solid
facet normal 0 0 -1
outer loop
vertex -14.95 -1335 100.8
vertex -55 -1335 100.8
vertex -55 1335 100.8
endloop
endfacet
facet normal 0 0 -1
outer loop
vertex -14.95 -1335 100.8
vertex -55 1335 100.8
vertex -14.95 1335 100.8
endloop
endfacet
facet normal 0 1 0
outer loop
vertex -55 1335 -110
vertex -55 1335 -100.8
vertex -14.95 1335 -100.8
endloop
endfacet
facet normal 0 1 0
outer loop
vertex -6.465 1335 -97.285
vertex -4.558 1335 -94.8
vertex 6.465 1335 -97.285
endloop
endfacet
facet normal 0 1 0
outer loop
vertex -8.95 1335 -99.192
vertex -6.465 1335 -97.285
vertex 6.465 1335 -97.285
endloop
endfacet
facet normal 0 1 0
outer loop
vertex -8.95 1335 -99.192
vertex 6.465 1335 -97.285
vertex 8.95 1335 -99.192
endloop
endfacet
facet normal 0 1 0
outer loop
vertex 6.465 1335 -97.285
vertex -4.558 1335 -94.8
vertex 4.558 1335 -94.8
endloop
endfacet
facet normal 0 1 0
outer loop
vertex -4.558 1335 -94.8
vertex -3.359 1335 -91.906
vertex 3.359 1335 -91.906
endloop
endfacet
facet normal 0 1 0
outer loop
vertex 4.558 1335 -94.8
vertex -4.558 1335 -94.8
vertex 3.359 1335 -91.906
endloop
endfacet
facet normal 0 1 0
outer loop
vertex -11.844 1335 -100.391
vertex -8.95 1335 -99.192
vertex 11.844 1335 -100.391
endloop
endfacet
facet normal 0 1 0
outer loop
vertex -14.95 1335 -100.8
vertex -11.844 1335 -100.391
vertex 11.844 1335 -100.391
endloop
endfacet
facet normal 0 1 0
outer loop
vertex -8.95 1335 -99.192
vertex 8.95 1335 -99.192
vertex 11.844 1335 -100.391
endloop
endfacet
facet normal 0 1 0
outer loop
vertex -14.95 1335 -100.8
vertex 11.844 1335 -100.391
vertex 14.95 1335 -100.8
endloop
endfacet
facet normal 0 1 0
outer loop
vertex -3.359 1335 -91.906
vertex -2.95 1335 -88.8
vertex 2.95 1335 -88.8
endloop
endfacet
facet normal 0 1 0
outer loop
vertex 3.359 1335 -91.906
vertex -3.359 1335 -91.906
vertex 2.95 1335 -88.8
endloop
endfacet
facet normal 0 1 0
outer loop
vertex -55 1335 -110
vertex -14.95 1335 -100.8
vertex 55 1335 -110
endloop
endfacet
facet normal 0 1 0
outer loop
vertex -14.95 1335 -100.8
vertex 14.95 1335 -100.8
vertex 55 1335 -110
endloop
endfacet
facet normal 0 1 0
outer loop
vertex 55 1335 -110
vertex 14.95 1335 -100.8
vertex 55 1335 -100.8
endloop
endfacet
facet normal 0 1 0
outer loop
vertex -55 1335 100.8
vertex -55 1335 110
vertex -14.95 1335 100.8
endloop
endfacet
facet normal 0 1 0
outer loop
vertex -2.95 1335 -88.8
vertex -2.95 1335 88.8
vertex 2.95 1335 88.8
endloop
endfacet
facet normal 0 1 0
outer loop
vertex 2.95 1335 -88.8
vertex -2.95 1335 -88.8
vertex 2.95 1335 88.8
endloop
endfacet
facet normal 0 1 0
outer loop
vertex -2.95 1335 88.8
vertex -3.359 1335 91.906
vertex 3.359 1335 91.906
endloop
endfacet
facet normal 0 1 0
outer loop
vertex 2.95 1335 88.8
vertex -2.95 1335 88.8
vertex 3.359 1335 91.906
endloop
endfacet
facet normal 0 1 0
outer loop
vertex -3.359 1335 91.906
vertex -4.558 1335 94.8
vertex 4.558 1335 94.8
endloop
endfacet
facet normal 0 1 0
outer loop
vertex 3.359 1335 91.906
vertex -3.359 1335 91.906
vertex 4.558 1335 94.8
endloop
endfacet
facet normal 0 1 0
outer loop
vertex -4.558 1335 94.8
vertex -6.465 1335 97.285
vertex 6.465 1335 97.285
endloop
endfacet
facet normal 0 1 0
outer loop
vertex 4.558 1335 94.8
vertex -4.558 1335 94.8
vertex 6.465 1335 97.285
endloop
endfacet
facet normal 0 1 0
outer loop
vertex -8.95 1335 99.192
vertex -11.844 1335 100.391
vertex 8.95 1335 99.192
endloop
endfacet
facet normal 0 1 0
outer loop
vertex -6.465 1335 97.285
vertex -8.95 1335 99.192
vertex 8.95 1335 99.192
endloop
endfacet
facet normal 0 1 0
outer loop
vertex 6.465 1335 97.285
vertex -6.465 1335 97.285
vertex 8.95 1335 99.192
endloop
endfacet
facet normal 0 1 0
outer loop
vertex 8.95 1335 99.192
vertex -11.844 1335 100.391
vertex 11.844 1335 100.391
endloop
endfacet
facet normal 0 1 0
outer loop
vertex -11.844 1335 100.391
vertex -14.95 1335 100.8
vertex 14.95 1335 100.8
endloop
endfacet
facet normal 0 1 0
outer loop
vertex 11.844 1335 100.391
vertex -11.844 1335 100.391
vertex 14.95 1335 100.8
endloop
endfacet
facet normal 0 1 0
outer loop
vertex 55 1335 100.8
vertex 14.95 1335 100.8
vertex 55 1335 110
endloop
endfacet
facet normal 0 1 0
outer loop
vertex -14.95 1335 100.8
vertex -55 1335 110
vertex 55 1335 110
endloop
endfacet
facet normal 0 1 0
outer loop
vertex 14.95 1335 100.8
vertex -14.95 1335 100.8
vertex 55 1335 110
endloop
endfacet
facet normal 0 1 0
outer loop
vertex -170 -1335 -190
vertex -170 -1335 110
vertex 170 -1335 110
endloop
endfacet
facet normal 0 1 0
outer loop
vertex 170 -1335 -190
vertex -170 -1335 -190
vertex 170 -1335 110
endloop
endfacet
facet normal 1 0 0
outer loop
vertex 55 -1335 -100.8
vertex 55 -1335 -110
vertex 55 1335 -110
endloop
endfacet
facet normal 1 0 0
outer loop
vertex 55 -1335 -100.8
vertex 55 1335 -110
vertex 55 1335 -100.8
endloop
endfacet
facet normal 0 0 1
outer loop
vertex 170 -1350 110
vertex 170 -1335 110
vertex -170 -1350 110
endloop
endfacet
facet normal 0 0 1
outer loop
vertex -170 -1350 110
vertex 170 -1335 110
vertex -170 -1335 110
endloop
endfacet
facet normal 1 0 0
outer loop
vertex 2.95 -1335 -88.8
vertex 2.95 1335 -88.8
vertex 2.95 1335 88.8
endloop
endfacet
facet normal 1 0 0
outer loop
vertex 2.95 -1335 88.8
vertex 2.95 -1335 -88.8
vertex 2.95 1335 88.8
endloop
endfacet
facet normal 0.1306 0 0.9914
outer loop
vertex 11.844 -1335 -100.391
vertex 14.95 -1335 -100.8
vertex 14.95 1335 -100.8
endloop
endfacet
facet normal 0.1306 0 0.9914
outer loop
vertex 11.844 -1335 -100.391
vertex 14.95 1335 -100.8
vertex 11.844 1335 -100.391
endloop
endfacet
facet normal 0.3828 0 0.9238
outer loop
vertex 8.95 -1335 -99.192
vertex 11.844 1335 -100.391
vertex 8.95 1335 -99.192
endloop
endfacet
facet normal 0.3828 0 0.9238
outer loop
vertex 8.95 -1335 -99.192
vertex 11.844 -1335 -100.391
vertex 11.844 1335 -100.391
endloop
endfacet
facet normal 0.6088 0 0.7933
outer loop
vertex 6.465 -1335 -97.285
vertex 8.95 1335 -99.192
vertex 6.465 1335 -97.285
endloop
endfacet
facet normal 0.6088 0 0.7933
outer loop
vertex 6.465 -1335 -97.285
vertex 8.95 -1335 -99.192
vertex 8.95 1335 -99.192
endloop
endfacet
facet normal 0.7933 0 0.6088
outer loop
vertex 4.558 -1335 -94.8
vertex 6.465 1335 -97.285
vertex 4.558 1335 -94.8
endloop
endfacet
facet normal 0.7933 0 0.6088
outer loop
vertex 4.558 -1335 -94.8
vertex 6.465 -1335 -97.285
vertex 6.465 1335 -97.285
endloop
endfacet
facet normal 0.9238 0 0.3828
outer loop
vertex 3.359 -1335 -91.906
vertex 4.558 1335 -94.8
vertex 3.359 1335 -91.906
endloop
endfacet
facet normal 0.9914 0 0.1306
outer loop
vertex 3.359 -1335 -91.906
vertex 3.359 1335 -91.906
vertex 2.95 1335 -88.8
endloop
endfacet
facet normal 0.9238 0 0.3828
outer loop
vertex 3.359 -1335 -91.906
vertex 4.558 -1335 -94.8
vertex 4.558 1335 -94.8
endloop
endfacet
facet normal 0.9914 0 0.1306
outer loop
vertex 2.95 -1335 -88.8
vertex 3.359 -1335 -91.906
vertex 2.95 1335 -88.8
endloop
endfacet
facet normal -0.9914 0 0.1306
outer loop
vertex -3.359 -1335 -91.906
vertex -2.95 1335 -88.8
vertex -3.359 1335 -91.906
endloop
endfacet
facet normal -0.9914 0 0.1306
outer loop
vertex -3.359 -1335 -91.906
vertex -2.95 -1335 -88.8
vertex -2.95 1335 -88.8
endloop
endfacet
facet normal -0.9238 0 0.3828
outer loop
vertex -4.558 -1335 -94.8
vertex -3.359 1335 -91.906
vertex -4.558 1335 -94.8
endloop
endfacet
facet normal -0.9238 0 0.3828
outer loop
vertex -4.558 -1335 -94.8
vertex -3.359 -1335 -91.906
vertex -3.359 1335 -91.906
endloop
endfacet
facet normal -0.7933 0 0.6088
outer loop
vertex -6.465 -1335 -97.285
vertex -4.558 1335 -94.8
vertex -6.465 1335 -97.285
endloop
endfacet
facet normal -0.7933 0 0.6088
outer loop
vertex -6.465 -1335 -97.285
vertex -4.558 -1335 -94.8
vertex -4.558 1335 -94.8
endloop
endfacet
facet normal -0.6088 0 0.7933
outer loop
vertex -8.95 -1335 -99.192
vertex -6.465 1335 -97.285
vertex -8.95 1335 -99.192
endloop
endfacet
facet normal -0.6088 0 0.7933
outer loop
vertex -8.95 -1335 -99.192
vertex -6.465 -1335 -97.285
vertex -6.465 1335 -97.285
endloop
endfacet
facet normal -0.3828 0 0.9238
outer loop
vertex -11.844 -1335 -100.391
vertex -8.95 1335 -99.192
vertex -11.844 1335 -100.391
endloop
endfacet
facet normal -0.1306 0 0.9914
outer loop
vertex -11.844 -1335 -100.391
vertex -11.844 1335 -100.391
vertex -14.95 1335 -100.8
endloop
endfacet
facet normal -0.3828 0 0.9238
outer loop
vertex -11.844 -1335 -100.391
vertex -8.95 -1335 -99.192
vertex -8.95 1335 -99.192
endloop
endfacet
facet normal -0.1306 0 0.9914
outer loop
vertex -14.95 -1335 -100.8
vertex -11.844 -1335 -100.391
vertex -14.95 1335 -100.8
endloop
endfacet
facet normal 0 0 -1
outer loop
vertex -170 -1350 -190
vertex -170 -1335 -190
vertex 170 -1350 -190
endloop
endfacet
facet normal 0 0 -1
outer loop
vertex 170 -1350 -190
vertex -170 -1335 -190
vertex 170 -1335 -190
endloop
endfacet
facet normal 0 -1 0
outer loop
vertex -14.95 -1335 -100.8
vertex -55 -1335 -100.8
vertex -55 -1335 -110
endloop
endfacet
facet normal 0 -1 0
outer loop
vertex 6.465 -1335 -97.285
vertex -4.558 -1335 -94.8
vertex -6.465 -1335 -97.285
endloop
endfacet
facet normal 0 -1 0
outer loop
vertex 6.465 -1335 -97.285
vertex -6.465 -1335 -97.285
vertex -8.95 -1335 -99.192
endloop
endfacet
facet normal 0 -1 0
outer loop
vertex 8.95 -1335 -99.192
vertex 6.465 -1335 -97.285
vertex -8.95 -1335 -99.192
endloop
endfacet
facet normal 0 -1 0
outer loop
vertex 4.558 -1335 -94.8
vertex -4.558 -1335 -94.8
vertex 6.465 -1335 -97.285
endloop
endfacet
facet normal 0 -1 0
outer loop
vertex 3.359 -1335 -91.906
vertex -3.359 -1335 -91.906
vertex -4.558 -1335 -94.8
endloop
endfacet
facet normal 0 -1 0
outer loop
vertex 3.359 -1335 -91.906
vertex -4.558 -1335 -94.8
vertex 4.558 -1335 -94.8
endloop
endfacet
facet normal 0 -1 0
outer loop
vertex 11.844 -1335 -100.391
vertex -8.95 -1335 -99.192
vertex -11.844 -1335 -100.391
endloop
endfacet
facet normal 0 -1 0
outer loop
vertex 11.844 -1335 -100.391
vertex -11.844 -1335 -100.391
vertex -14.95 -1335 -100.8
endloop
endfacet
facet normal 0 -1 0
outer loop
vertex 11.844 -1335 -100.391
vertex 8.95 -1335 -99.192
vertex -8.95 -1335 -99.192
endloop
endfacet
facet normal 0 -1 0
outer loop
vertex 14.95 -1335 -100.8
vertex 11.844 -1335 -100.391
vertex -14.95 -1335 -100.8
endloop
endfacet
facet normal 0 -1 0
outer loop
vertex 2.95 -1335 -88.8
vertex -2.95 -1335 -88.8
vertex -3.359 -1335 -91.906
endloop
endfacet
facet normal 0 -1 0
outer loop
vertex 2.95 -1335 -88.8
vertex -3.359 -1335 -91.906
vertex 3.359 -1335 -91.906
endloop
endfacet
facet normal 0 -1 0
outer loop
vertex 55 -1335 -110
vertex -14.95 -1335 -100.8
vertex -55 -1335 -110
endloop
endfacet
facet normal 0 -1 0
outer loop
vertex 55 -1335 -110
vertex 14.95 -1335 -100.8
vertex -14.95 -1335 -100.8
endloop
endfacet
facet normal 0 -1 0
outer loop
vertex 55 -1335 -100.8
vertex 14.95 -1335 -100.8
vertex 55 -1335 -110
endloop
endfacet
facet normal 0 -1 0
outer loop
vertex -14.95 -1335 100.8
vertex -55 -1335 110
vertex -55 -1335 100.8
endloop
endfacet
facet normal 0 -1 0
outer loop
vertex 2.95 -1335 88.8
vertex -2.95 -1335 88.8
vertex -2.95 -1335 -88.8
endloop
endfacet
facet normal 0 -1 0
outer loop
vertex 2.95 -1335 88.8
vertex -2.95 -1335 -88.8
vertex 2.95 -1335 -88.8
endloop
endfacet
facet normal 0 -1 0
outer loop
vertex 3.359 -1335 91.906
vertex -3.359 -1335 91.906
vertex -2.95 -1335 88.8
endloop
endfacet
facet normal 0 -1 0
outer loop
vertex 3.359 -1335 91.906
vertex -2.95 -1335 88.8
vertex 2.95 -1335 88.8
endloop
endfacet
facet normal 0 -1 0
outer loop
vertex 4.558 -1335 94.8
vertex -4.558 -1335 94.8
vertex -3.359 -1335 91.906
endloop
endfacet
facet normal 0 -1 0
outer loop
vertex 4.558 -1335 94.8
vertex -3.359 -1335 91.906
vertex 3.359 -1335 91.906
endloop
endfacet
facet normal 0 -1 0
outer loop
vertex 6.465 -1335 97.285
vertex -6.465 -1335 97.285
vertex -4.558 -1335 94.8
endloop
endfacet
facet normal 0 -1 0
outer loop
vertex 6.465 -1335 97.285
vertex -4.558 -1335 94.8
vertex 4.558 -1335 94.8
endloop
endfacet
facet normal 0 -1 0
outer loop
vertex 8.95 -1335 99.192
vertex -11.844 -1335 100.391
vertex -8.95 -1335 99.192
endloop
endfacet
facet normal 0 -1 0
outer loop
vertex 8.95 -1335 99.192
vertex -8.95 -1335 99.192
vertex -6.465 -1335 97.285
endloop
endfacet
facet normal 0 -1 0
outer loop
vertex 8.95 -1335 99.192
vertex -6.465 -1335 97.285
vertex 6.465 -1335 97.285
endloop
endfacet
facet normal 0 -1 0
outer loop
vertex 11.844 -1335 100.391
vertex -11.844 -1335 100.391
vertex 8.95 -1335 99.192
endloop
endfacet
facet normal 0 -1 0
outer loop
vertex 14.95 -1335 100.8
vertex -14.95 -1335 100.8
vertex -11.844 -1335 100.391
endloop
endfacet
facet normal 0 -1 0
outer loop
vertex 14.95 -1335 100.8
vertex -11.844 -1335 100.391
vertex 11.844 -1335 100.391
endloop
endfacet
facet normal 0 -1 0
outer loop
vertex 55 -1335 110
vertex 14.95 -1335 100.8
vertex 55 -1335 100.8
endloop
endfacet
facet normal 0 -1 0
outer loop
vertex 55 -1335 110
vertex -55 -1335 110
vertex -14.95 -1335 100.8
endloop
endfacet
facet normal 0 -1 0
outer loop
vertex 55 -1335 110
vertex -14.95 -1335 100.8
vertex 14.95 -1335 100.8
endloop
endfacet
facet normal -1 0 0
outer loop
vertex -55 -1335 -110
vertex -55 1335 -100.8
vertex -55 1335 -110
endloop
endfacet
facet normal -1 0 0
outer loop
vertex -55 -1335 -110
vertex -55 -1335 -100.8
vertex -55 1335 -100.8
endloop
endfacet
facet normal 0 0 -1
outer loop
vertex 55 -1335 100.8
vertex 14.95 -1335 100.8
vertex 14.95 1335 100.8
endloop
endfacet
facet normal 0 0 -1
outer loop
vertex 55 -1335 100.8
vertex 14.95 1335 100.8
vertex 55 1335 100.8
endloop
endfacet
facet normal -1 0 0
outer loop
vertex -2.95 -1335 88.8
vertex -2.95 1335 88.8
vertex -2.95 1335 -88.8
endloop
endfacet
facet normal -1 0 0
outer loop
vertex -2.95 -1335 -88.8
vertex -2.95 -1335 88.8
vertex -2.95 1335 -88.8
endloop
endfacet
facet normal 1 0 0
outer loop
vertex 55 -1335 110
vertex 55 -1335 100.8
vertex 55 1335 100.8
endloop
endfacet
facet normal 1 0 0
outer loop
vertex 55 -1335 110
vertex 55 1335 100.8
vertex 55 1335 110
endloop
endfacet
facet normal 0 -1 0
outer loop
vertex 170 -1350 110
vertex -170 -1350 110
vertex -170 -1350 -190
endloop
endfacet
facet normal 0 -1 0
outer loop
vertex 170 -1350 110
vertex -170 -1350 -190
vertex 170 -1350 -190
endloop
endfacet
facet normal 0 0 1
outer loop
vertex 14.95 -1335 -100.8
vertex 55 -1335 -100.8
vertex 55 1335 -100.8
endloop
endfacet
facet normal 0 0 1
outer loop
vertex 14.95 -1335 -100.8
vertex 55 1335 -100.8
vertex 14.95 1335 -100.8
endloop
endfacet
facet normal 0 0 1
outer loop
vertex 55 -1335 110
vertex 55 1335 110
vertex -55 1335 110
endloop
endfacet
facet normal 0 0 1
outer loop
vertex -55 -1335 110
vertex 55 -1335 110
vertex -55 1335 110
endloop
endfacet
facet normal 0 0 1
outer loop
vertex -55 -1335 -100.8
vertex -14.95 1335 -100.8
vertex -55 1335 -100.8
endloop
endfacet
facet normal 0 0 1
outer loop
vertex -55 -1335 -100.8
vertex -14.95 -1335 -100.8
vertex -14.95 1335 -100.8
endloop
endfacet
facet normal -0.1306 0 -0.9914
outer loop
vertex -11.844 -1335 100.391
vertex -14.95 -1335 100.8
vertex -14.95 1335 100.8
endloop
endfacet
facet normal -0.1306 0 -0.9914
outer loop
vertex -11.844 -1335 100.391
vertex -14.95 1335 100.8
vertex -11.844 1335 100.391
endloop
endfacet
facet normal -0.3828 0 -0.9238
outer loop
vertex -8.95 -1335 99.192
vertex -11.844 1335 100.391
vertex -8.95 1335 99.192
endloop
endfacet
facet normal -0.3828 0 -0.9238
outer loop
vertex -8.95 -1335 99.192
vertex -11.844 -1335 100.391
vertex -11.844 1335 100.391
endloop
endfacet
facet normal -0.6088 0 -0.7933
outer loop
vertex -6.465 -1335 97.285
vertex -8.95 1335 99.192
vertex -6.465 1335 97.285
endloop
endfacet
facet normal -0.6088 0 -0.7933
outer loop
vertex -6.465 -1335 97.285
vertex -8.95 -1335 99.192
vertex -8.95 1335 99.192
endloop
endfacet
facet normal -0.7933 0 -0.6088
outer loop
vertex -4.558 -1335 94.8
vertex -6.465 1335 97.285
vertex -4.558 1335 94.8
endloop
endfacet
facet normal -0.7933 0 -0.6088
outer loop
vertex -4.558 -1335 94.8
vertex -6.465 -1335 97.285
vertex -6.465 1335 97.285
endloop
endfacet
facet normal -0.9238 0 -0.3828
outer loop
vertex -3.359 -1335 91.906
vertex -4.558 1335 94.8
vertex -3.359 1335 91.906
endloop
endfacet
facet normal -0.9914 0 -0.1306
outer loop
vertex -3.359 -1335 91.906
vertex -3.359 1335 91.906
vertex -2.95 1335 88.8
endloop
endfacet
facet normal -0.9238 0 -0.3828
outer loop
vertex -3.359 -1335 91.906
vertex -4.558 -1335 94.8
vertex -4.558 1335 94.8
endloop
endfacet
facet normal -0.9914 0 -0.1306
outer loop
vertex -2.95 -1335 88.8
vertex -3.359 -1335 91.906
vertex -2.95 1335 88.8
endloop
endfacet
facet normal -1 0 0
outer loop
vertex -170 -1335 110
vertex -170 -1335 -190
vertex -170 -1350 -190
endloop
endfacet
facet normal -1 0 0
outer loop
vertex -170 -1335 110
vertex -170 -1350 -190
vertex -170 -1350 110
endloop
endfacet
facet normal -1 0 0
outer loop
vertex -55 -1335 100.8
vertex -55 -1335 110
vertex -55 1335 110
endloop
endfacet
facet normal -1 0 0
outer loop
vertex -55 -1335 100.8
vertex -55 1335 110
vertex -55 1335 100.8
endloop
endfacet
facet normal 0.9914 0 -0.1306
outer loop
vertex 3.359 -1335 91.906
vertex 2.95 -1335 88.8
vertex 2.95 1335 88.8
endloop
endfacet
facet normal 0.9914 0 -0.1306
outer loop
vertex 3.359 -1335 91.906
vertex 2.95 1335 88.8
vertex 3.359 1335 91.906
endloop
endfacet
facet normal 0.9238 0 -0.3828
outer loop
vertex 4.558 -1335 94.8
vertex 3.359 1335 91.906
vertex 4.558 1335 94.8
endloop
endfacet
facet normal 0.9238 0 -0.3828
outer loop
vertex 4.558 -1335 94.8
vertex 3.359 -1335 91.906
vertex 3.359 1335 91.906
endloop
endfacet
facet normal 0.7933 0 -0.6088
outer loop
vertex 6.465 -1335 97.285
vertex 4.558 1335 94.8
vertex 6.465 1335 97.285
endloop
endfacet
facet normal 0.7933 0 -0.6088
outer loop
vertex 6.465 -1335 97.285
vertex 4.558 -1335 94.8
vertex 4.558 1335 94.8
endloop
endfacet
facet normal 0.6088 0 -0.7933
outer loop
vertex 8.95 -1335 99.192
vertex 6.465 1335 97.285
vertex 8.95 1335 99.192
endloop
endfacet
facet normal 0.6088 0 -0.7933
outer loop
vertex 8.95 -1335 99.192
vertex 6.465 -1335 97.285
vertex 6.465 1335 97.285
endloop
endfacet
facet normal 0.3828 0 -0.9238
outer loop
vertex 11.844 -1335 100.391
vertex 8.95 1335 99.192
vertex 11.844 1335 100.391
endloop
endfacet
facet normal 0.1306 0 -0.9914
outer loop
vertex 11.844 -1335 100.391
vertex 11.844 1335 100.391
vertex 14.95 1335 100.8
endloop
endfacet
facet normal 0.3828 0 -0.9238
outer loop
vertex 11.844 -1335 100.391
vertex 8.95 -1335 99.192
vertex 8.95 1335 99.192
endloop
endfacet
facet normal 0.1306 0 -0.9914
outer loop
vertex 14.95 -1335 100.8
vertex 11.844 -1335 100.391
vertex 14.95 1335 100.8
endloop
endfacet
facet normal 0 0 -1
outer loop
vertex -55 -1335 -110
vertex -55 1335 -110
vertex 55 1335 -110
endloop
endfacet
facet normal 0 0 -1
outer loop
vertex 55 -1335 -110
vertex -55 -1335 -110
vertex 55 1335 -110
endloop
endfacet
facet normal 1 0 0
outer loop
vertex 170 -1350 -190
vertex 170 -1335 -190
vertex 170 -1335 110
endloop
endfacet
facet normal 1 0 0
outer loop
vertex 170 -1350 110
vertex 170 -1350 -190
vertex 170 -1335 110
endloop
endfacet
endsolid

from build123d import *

# Parameters (mm, degrees)
F1_DEPTH = 1335
F2_W     = 340
F2_H     = 300
F3_DEPTH = 15


with BuildPart() as f1:
    # F0 (on Front) → F1 (new body, symmetric)
    with BuildSketch(Plane.XZ):
        with BuildLine():
            Line((-55, -100.8), (-55, -110))
            Line((-55, -110), (0, -110))
            Line((0, -110), (55, -110))
            Line((55, -110), (55, -100.8))
            Line((55, -100.8), (14.95, -100.8))
            ThreePointArc((14.95, -100.8), (6.464719, -97.285281), (2.95, -88.8))
            Line((2.95, -88.8), (2.95, 0))
            Line((2.95, 0), (2.95, 88.8))
            ThreePointArc((2.95, 88.8), (6.464719, 97.285281), (14.95, 100.8))
            Line((14.95, 100.8), (55, 100.8))
            Line((55, 100.8), (55, 110))
            Line((55, 110), (0, 110))
            Line((0, 110), (-55, 110))
            Line((-55, 110), (-55, 100.8))
            Line((-55, 100.8), (-14.95, 100.8))
            ThreePointArc((-14.95, 100.8), (-6.464719, 97.285281), (-2.95, 88.8))
            Line((-2.95, 88.8), (-2.95, 0))
            Line((-2.95, 0), (-2.95, -88.8))
            ThreePointArc((-2.95, -88.8), (-6.464719, -97.285281), (-14.95, -100.8))
            Line((-14.95, -100.8), (-55, -100.8))
        make_face()
    extrude(amount=F1_DEPTH, both=True)


with BuildPart() as f3:
    # F2 (on face) → F3 (new body)
    with BuildSketch(Plane.XZ.offset(1335)):
        with Locations((0, -40)):
            Rectangle(F2_W, F2_H)
        with BuildLine():
            Line((-55, 110), (-170, 110))
            Line((-170, 110), (-170, -190))
            Line((-170, -190), (170, -190))
            Line((170, -190), (170, 110))
            Line((170, 110), (55, 110))
            Line((55, 110), (55, 100.8))
            Line((55, 100.8), (14.95, 100.8))
            ThreePointArc((14.95, 100.8), (6.464719, 97.285281), (2.95, 88.8))
            Line((2.95, 88.8), (2.95, -88.8))
            ThreePointArc((2.95, -88.8), (6.464719, -97.285281), (14.95, -100.8))
            Line((14.95, -100.8), (55, -100.8))
            Line((55, -100.8), (55, -110))
            Line((55, -110), (-55, -110))
            Line((-55, -110), (-55, -100.8))
            Line((-55, -100.8), (-14.95, -100.8))
            ThreePointArc((-14.95, -100.8), (-6.464719, -97.285281), (-2.95, -88.8))
            Line((-2.95, -88.8), (-2.95, 88.8))
            ThreePointArc((-2.95, 88.8), (-6.464719, 97.285281), (-14.95, 100.8))
            Line((-14.95, 100.8), (-55, 100.8))
            Line((-55, 100.8), (-55, 110))
        make_face()
    extrude(amount=F3_DEPTH)


solid = Compound([f1.part, f3.part])
